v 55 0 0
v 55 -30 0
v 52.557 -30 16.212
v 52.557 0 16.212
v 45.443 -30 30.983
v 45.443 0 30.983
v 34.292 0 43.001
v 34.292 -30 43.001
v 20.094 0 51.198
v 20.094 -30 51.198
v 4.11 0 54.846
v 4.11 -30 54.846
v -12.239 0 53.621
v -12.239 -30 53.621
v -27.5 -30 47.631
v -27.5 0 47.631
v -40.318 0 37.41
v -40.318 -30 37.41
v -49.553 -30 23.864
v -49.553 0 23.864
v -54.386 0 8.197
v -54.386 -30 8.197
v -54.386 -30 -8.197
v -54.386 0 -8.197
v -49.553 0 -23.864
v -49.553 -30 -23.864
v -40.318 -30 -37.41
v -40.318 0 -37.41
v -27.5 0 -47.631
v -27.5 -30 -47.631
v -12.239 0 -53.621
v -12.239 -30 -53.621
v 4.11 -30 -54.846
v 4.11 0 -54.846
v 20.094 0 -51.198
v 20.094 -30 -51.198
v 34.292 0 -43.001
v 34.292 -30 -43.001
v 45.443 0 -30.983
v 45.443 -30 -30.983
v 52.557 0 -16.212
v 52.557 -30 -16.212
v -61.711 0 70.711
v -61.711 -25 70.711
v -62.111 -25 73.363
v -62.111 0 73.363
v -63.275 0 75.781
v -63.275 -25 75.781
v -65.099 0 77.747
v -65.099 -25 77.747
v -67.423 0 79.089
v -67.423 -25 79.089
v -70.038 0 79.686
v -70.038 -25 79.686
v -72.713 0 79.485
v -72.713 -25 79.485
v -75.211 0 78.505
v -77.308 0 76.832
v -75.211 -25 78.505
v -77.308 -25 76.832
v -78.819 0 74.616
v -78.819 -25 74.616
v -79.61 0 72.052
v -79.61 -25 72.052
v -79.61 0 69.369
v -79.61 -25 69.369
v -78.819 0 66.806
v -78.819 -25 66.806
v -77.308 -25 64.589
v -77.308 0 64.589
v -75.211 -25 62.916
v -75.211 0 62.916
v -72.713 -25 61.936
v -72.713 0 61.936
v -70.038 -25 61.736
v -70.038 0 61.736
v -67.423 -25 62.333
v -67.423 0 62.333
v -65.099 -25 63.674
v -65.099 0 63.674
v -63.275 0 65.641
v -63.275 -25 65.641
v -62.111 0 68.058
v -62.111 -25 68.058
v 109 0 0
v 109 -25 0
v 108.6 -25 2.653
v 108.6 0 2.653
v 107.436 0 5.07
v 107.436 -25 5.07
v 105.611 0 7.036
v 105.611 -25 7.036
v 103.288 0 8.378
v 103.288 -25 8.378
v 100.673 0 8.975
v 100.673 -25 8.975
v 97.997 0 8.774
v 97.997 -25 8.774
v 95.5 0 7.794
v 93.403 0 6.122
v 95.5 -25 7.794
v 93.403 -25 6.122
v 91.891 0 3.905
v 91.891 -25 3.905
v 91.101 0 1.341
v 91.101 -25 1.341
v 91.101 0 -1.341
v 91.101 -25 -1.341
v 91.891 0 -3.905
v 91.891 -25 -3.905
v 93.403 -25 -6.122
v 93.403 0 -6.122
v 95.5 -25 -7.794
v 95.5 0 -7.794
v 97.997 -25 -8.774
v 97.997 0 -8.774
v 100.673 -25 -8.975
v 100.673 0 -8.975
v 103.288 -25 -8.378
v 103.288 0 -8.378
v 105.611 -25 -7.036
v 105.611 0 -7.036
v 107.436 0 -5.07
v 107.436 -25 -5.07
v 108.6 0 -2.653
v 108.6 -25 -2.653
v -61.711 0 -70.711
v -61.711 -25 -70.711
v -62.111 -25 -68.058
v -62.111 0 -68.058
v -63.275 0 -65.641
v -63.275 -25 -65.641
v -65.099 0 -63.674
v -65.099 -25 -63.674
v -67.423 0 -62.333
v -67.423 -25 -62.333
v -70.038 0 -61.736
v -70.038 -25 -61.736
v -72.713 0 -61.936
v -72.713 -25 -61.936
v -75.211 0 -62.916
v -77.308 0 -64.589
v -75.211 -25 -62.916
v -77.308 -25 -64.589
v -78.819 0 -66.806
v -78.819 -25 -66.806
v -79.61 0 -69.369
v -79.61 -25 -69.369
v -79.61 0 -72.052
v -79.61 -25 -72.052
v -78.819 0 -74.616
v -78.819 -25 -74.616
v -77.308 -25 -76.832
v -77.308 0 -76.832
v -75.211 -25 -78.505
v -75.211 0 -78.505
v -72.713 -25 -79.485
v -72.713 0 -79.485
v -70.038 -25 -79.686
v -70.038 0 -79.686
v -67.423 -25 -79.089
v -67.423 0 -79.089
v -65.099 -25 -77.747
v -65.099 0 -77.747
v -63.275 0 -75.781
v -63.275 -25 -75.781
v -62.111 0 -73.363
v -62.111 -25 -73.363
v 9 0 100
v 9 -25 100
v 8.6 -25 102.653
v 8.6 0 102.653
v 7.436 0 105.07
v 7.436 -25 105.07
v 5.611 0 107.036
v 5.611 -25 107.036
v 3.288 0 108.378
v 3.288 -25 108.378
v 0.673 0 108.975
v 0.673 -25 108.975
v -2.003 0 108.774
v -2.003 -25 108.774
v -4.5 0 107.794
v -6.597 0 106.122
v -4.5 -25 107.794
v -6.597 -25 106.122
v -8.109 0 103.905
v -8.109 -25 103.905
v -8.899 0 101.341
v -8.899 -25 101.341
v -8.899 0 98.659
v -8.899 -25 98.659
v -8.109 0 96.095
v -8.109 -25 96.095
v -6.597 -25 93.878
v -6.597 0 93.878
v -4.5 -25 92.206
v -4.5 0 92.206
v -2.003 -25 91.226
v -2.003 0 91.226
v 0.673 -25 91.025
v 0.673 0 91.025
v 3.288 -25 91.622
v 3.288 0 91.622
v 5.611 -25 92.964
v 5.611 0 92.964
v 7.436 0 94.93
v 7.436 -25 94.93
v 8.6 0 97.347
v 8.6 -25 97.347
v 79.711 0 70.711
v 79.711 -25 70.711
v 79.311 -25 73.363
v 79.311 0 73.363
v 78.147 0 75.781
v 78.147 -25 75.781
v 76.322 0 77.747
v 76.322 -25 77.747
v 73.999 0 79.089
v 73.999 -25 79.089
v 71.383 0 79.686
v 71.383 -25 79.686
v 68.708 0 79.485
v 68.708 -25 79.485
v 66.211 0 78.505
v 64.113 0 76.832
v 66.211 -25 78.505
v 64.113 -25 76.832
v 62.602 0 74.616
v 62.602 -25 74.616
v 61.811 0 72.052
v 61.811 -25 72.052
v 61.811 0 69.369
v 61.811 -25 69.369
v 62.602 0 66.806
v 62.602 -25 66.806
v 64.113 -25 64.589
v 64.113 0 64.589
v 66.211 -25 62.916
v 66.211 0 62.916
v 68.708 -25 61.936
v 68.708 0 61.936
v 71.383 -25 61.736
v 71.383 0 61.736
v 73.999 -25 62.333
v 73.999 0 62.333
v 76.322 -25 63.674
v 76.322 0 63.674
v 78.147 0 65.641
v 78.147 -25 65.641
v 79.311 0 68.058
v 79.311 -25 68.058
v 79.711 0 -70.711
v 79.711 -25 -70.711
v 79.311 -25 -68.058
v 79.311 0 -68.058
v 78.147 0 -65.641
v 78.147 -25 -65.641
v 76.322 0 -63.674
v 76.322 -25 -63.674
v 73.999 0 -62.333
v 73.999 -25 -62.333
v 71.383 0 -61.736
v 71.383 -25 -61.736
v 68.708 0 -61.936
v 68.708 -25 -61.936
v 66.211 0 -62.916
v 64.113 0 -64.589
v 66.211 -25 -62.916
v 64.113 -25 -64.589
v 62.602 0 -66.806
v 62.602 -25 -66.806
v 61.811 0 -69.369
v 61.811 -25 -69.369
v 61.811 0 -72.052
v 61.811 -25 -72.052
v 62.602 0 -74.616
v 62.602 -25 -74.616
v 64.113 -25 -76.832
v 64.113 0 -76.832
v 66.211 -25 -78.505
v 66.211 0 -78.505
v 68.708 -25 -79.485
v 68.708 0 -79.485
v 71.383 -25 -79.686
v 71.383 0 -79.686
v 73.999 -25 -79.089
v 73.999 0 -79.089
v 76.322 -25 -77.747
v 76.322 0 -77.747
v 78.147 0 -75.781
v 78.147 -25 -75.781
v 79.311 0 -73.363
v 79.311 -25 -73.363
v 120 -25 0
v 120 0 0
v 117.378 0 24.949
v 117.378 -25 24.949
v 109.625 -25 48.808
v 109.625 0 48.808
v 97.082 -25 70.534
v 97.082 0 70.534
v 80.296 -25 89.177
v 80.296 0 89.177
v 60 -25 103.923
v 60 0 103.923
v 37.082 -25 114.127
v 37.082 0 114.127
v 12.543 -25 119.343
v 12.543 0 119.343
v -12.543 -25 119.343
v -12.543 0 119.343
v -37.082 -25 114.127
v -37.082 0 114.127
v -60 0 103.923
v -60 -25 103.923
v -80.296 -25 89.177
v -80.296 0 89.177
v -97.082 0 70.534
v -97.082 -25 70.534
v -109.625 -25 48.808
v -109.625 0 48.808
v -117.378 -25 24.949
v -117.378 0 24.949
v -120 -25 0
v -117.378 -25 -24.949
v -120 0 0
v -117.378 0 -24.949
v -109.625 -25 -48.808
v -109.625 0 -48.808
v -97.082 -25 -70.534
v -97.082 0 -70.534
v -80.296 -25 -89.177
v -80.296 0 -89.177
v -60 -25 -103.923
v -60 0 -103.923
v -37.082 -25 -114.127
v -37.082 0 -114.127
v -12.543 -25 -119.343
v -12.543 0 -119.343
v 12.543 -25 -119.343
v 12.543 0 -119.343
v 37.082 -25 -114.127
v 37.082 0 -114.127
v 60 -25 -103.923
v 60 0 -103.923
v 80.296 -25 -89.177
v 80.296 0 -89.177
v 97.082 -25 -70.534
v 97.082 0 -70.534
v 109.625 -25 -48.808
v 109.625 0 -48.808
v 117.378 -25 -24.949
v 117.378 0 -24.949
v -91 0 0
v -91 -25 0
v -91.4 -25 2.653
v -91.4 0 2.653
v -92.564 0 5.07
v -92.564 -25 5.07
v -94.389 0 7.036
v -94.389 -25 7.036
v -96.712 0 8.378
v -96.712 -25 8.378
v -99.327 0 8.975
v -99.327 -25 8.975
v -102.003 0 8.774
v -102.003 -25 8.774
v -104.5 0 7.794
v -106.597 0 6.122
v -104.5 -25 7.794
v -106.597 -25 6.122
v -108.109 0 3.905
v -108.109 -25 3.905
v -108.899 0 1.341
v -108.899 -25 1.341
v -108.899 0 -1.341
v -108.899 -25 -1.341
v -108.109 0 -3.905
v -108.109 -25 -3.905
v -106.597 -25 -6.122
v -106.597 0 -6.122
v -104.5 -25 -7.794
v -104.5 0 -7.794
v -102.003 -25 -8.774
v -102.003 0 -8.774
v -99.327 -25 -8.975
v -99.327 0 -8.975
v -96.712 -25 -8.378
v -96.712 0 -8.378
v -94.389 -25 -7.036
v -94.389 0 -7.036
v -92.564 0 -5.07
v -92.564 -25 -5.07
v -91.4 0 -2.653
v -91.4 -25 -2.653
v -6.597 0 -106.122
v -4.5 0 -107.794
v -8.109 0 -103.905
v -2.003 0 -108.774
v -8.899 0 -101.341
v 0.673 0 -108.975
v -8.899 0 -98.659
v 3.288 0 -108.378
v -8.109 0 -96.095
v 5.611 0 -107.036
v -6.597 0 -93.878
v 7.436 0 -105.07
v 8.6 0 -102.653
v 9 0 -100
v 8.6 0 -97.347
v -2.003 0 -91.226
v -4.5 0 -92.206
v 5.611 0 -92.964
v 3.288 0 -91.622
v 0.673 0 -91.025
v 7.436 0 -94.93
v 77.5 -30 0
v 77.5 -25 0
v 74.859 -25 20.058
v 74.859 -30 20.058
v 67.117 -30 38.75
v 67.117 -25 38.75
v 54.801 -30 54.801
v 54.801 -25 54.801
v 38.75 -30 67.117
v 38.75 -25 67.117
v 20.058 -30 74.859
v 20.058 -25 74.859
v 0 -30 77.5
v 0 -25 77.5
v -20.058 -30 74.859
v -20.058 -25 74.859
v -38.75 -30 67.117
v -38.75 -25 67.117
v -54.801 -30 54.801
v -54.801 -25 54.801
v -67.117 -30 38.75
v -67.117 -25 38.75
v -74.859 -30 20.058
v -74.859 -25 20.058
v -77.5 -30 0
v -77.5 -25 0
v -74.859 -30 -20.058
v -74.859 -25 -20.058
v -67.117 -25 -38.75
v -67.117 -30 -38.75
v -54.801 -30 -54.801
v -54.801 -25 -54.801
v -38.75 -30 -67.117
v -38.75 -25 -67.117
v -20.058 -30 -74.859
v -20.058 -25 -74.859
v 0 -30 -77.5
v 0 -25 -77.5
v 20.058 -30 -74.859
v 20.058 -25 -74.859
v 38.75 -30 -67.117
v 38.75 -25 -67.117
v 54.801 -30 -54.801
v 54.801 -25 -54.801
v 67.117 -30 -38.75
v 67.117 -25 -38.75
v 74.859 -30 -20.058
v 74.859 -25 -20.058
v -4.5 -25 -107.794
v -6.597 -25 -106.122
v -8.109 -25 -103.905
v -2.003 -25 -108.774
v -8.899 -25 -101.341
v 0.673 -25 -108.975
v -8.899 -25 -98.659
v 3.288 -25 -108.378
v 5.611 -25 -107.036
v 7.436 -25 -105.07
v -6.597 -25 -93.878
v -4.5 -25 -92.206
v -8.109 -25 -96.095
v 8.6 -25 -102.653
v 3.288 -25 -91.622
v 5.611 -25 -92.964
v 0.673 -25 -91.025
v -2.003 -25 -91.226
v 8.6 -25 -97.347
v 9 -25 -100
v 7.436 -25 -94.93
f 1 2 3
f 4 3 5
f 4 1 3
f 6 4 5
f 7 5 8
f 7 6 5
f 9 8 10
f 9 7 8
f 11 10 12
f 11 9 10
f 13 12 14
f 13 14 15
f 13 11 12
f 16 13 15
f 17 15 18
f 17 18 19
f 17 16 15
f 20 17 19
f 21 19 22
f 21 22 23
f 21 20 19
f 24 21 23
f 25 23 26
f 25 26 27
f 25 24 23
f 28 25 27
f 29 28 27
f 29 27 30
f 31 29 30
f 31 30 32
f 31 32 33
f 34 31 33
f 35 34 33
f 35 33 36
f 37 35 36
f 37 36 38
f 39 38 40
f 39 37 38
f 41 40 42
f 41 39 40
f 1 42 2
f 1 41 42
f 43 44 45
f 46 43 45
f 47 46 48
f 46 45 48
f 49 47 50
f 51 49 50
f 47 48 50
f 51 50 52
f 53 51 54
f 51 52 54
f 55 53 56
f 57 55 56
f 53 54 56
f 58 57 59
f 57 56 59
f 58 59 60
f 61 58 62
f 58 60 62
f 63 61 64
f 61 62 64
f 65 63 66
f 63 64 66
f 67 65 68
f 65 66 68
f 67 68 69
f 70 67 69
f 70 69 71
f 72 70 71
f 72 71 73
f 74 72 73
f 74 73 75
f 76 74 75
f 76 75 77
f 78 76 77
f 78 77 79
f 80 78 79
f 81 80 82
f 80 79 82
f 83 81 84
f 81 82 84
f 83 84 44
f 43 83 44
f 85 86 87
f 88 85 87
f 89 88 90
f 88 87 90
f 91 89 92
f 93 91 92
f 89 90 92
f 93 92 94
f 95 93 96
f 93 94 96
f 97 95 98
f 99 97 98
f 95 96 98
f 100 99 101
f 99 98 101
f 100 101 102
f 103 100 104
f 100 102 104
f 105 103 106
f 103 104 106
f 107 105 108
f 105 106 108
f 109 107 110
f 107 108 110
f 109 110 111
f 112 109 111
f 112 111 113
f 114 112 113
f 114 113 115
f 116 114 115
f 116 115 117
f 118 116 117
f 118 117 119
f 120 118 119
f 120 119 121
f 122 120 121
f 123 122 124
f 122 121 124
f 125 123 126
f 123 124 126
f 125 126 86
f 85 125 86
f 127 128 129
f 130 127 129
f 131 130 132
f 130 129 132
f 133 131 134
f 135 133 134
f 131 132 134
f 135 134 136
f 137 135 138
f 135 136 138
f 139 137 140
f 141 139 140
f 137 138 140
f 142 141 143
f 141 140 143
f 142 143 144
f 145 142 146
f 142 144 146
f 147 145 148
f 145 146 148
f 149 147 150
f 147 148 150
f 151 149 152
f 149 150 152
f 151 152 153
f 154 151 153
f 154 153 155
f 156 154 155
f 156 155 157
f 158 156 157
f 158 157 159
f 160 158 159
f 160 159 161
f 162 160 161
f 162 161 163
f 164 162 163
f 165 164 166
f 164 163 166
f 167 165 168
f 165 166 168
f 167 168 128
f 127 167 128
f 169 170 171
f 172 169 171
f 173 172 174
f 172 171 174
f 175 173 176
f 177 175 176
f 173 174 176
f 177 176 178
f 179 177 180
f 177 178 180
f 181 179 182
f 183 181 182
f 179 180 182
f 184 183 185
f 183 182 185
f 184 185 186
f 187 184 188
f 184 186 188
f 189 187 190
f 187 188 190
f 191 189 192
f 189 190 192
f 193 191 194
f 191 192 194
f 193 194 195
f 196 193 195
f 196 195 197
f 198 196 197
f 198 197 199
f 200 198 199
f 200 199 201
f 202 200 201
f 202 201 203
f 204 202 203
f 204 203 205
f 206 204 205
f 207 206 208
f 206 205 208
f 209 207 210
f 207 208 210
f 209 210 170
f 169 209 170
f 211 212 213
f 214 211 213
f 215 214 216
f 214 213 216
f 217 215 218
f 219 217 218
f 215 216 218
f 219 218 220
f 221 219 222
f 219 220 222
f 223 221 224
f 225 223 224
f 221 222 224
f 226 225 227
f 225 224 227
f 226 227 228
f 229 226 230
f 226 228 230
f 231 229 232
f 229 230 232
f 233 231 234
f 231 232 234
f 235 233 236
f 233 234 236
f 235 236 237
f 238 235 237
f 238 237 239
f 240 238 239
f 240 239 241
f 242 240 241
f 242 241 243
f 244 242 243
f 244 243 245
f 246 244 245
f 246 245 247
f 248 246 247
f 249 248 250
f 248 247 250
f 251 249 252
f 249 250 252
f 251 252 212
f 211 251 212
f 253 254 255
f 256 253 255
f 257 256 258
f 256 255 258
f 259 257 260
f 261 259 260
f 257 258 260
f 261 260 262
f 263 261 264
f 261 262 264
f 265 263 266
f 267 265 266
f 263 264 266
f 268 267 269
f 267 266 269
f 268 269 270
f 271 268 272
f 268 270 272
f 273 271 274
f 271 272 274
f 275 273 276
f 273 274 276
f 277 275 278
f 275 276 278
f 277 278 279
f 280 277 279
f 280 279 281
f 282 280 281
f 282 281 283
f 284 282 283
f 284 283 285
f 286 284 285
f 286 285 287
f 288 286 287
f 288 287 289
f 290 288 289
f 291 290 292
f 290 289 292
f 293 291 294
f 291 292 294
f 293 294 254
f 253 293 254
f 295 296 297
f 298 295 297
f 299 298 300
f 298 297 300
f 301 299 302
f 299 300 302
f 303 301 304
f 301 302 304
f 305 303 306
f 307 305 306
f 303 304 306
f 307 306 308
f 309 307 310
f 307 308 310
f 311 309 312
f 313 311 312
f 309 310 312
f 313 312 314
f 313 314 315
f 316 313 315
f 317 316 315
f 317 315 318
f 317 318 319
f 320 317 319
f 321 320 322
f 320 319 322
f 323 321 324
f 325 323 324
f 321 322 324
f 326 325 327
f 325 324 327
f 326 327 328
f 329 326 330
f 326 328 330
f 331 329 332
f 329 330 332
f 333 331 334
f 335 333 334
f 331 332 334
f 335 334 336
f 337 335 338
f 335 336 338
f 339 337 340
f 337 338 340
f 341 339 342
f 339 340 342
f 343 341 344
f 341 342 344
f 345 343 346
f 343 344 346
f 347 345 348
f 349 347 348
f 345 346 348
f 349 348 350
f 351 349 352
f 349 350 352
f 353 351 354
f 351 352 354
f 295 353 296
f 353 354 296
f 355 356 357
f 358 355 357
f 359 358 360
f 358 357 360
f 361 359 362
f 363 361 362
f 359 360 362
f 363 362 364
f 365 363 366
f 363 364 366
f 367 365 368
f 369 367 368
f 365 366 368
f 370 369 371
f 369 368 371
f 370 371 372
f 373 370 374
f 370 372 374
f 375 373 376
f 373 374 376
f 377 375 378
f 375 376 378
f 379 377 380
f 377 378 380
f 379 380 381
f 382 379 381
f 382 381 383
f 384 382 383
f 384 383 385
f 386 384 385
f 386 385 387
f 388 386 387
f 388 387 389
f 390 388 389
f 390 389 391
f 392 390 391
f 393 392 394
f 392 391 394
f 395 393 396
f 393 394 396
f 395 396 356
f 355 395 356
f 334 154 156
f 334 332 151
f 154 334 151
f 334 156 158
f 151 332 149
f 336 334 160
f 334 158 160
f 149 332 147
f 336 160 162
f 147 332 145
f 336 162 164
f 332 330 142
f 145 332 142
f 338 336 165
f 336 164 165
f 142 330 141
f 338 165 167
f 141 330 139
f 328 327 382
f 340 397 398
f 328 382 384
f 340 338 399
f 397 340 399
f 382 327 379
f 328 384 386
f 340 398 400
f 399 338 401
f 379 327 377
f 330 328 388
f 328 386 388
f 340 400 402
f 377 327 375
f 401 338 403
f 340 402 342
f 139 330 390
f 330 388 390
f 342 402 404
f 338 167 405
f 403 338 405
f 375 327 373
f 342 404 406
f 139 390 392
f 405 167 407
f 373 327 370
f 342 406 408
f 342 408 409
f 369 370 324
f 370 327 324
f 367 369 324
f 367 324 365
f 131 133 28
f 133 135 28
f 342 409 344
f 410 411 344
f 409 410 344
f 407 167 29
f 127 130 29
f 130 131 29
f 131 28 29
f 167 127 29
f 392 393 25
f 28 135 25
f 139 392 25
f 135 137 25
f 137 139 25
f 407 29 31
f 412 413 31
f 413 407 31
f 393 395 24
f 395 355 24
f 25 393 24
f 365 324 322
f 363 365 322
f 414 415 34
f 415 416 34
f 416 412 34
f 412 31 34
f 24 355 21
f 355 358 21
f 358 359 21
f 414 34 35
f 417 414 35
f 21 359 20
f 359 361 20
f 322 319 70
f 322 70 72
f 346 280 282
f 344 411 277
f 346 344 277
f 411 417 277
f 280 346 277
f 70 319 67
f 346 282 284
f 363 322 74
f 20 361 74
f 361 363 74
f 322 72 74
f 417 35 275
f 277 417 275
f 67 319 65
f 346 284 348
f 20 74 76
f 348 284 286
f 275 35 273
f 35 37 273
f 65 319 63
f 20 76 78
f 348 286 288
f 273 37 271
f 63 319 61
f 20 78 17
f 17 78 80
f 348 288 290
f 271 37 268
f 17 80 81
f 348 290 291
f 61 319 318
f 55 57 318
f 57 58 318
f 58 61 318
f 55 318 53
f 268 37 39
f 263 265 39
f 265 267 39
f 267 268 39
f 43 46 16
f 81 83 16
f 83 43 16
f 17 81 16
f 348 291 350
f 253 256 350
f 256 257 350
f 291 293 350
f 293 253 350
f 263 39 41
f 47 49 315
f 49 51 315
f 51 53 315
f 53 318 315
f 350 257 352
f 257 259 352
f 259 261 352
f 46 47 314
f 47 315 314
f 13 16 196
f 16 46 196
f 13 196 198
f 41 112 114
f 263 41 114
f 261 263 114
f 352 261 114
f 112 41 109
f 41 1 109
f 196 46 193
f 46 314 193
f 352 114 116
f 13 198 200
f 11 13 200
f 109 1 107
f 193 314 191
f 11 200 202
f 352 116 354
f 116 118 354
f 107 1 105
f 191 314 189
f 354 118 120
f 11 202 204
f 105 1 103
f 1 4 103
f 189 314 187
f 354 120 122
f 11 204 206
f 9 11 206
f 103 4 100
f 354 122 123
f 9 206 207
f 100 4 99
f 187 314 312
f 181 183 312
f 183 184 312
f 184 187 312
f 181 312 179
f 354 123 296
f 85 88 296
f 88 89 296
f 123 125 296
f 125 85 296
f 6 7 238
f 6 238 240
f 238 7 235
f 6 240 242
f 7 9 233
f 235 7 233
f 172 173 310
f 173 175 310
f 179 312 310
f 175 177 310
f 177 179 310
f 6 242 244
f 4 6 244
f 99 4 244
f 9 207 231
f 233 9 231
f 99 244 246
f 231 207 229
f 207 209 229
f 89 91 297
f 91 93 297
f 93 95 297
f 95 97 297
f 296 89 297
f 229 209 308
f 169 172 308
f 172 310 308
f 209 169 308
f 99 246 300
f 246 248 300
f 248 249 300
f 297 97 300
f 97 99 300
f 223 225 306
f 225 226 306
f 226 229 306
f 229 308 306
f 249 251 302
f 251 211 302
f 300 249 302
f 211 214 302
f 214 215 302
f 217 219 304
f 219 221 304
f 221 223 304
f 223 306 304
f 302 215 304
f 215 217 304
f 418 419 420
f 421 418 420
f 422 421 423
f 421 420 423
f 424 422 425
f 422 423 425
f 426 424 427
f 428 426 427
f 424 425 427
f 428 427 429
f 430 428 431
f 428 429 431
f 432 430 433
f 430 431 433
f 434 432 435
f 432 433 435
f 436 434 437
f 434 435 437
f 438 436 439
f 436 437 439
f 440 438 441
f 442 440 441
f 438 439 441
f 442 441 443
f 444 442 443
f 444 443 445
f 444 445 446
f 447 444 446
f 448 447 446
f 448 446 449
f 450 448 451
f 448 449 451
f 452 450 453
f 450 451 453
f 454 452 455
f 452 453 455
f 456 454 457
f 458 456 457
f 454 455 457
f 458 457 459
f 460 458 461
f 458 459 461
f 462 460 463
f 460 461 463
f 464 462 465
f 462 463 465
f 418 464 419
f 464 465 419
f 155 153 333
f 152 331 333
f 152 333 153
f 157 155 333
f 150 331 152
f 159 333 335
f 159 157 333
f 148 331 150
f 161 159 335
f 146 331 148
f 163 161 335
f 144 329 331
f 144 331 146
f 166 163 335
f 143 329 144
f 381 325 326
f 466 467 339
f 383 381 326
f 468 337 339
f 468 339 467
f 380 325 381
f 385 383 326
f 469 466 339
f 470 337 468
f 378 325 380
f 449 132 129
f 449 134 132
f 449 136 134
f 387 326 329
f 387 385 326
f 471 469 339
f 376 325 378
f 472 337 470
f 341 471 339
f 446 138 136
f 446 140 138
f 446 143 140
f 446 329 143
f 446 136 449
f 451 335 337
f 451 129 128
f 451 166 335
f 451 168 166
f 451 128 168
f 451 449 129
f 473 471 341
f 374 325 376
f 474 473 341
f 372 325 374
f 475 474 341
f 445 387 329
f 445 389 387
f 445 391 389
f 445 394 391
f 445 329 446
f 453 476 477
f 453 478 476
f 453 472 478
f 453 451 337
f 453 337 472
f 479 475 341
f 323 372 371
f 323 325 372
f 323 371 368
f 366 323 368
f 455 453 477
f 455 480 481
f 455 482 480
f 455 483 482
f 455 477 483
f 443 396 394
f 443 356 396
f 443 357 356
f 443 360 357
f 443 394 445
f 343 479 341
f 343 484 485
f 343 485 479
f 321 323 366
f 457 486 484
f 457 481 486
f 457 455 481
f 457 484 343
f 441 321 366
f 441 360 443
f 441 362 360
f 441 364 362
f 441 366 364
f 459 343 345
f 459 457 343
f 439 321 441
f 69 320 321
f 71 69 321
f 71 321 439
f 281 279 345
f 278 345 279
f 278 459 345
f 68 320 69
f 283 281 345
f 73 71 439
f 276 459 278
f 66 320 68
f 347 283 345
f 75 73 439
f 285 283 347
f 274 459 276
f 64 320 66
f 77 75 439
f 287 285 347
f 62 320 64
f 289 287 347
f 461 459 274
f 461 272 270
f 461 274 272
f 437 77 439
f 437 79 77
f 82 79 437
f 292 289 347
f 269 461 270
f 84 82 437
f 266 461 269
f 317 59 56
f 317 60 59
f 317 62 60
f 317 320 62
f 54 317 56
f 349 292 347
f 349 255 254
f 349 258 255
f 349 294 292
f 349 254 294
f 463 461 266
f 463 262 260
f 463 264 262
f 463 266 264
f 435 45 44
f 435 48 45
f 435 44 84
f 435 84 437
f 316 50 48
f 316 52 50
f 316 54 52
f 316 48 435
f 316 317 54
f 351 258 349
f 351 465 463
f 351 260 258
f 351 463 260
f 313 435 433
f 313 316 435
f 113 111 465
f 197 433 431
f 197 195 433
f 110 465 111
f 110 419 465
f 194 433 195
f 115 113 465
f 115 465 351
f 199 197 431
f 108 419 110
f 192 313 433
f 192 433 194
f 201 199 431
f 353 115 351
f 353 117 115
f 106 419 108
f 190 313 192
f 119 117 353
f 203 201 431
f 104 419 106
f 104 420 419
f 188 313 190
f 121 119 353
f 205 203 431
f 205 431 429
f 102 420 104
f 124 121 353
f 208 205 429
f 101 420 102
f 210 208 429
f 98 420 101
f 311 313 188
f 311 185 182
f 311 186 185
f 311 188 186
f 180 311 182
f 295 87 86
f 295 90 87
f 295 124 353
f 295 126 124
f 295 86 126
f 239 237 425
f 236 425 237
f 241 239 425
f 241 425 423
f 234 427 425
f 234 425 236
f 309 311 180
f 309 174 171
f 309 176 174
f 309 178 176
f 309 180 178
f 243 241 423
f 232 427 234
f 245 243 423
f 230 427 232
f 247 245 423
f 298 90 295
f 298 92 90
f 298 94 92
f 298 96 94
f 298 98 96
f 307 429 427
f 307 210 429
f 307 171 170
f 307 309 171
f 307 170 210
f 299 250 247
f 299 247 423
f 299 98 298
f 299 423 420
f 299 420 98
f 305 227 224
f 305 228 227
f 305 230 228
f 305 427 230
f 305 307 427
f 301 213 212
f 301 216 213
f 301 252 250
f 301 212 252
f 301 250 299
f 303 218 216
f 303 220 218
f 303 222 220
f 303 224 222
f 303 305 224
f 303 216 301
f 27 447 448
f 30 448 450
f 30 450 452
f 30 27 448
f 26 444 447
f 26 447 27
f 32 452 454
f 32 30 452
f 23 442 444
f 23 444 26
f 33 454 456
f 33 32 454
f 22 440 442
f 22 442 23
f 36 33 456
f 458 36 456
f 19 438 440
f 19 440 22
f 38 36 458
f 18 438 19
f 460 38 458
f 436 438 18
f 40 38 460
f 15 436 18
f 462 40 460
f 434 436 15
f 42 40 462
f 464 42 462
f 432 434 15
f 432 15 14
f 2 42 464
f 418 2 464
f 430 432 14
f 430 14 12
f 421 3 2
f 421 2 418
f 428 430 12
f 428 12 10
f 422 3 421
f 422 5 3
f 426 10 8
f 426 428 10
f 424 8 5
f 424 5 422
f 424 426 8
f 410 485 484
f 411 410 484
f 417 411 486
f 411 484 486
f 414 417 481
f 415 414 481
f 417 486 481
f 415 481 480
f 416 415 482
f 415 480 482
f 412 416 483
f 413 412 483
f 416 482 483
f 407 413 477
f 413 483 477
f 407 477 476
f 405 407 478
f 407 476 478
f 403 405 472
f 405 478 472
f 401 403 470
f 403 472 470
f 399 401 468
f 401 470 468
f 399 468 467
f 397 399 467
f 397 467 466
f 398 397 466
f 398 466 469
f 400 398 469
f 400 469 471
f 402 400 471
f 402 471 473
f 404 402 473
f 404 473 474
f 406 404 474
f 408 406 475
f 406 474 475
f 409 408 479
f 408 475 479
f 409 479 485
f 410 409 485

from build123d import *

# Parameters (mm, degrees)
F0_R     = 120
F0_R_2   = 55
F1_DEPTH = 25
F3_R     = 9
F4_DEPTH = 25
F5_R     = 77.5
F5_R_2   = 55
F6_DEPTH = 5


with BuildPart() as f1:
    # F0 (on Front) → F1 (new body)
    with BuildSketch(Plane.XZ):
        Circle(F0_R)
        Circle(F0_R_2, mode=Mode.SUBTRACT)
    extrude(amount=F1_DEPTH)

    # F3 (on face) → F4 (cut)
    with BuildSketch(Plane.XZ.offset(25)):
        with Locations((0, 100)):
            Circle(F3_R)
        with Locations((-70.710678, 70.710678)):
            Circle(F3_R)
        with Locations((-100, 0)):
            Circle(F3_R)
        with Locations((-70.710678, -70.710678)):
            Circle(F3_R)
        with Locations((0, -100)):
            Circle(F3_R)
        with Locations((70.710678, -70.710678)):
            Circle(F3_R)
        with Locations((100, 0)):
            Circle(F3_R)
        with Locations((70.710678, 70.710678)):
            Circle(F3_R)
    extrude(amount=-F4_DEPTH, mode=Mode.SUBTRACT)

    # F5 (on face) → F6 (join)
    with BuildSketch(Plane.XZ.offset(25)):
        Circle(F5_R)
        Circle(F5_R_2, mode=Mode.SUBTRACT)
    extrude(amount=F6_DEPTH)


solid = f1.part
